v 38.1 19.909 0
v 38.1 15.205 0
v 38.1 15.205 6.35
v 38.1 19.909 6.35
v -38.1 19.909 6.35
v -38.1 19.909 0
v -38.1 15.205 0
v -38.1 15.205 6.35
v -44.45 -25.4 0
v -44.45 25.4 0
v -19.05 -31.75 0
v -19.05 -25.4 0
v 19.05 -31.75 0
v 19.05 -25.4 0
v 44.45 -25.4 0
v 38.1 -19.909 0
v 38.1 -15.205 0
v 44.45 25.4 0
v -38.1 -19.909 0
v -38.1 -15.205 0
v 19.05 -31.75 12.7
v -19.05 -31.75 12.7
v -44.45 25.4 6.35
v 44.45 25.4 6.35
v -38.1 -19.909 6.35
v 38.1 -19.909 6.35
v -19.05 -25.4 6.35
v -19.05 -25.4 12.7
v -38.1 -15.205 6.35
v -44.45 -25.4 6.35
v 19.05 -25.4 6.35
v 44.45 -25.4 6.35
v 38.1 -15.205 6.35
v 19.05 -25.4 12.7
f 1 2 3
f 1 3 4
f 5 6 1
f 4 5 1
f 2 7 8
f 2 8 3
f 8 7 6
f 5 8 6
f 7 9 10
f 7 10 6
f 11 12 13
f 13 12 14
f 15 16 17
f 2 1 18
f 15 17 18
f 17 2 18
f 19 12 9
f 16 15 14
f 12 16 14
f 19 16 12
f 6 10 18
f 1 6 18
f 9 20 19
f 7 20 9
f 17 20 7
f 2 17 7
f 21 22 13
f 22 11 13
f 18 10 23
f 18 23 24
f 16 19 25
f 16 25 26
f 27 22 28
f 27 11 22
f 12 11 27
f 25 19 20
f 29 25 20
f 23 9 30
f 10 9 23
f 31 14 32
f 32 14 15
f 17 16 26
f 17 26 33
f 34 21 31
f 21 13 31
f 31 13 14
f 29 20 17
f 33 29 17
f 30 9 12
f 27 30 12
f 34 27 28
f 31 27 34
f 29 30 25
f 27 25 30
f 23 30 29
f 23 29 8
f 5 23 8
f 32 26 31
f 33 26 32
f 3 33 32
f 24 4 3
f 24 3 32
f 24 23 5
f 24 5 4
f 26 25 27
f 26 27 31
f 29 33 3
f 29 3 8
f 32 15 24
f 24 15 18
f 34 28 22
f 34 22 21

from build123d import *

# Parameters (mm, degrees)
F0_W     = 88.9
F0_H     = 50.8
F0_W_2   = 76.2
F0_H_2   = 4.70328
F1_DEPTH = 6.35
F2_W     = 38.1
F2_H     = 6.35
F3_DEPTH = 6.35
F4_W     = 38.1
F4_H     = 6.35
F5_DEPTH = 6.35


with BuildPart() as f1:
    # F0 (on Top) → F1 (new body)
    with BuildSketch(Plane.XY):
        Rectangle(F0_W, F0_H)
        with Locations((0, -17.556932)):
            Rectangle(F0_W_2, F0_H_2, mode=Mode.SUBTRACT)
        with Locations((0, 17.556932)):
            Rectangle(F0_W_2, F0_H_2, mode=Mode.SUBTRACT)
    extrude(amount=F1_DEPTH)

    # F2 (on face) → F3 (join)
    with BuildSketch(Plane.XZ.offset(25.4)):
        with Locations((0, 3.175)):
            Rectangle(F2_W, F2_H)
    extrude(amount=F3_DEPTH)

    # F4 (on face) → F5 (join)
    with BuildSketch(Plane.XY.offset(6.35)):
        with Locations((0, -28.575)):
            Rectangle(F4_W, F4_H)
    extrude(amount=F5_DEPTH)


solid = f1.part
